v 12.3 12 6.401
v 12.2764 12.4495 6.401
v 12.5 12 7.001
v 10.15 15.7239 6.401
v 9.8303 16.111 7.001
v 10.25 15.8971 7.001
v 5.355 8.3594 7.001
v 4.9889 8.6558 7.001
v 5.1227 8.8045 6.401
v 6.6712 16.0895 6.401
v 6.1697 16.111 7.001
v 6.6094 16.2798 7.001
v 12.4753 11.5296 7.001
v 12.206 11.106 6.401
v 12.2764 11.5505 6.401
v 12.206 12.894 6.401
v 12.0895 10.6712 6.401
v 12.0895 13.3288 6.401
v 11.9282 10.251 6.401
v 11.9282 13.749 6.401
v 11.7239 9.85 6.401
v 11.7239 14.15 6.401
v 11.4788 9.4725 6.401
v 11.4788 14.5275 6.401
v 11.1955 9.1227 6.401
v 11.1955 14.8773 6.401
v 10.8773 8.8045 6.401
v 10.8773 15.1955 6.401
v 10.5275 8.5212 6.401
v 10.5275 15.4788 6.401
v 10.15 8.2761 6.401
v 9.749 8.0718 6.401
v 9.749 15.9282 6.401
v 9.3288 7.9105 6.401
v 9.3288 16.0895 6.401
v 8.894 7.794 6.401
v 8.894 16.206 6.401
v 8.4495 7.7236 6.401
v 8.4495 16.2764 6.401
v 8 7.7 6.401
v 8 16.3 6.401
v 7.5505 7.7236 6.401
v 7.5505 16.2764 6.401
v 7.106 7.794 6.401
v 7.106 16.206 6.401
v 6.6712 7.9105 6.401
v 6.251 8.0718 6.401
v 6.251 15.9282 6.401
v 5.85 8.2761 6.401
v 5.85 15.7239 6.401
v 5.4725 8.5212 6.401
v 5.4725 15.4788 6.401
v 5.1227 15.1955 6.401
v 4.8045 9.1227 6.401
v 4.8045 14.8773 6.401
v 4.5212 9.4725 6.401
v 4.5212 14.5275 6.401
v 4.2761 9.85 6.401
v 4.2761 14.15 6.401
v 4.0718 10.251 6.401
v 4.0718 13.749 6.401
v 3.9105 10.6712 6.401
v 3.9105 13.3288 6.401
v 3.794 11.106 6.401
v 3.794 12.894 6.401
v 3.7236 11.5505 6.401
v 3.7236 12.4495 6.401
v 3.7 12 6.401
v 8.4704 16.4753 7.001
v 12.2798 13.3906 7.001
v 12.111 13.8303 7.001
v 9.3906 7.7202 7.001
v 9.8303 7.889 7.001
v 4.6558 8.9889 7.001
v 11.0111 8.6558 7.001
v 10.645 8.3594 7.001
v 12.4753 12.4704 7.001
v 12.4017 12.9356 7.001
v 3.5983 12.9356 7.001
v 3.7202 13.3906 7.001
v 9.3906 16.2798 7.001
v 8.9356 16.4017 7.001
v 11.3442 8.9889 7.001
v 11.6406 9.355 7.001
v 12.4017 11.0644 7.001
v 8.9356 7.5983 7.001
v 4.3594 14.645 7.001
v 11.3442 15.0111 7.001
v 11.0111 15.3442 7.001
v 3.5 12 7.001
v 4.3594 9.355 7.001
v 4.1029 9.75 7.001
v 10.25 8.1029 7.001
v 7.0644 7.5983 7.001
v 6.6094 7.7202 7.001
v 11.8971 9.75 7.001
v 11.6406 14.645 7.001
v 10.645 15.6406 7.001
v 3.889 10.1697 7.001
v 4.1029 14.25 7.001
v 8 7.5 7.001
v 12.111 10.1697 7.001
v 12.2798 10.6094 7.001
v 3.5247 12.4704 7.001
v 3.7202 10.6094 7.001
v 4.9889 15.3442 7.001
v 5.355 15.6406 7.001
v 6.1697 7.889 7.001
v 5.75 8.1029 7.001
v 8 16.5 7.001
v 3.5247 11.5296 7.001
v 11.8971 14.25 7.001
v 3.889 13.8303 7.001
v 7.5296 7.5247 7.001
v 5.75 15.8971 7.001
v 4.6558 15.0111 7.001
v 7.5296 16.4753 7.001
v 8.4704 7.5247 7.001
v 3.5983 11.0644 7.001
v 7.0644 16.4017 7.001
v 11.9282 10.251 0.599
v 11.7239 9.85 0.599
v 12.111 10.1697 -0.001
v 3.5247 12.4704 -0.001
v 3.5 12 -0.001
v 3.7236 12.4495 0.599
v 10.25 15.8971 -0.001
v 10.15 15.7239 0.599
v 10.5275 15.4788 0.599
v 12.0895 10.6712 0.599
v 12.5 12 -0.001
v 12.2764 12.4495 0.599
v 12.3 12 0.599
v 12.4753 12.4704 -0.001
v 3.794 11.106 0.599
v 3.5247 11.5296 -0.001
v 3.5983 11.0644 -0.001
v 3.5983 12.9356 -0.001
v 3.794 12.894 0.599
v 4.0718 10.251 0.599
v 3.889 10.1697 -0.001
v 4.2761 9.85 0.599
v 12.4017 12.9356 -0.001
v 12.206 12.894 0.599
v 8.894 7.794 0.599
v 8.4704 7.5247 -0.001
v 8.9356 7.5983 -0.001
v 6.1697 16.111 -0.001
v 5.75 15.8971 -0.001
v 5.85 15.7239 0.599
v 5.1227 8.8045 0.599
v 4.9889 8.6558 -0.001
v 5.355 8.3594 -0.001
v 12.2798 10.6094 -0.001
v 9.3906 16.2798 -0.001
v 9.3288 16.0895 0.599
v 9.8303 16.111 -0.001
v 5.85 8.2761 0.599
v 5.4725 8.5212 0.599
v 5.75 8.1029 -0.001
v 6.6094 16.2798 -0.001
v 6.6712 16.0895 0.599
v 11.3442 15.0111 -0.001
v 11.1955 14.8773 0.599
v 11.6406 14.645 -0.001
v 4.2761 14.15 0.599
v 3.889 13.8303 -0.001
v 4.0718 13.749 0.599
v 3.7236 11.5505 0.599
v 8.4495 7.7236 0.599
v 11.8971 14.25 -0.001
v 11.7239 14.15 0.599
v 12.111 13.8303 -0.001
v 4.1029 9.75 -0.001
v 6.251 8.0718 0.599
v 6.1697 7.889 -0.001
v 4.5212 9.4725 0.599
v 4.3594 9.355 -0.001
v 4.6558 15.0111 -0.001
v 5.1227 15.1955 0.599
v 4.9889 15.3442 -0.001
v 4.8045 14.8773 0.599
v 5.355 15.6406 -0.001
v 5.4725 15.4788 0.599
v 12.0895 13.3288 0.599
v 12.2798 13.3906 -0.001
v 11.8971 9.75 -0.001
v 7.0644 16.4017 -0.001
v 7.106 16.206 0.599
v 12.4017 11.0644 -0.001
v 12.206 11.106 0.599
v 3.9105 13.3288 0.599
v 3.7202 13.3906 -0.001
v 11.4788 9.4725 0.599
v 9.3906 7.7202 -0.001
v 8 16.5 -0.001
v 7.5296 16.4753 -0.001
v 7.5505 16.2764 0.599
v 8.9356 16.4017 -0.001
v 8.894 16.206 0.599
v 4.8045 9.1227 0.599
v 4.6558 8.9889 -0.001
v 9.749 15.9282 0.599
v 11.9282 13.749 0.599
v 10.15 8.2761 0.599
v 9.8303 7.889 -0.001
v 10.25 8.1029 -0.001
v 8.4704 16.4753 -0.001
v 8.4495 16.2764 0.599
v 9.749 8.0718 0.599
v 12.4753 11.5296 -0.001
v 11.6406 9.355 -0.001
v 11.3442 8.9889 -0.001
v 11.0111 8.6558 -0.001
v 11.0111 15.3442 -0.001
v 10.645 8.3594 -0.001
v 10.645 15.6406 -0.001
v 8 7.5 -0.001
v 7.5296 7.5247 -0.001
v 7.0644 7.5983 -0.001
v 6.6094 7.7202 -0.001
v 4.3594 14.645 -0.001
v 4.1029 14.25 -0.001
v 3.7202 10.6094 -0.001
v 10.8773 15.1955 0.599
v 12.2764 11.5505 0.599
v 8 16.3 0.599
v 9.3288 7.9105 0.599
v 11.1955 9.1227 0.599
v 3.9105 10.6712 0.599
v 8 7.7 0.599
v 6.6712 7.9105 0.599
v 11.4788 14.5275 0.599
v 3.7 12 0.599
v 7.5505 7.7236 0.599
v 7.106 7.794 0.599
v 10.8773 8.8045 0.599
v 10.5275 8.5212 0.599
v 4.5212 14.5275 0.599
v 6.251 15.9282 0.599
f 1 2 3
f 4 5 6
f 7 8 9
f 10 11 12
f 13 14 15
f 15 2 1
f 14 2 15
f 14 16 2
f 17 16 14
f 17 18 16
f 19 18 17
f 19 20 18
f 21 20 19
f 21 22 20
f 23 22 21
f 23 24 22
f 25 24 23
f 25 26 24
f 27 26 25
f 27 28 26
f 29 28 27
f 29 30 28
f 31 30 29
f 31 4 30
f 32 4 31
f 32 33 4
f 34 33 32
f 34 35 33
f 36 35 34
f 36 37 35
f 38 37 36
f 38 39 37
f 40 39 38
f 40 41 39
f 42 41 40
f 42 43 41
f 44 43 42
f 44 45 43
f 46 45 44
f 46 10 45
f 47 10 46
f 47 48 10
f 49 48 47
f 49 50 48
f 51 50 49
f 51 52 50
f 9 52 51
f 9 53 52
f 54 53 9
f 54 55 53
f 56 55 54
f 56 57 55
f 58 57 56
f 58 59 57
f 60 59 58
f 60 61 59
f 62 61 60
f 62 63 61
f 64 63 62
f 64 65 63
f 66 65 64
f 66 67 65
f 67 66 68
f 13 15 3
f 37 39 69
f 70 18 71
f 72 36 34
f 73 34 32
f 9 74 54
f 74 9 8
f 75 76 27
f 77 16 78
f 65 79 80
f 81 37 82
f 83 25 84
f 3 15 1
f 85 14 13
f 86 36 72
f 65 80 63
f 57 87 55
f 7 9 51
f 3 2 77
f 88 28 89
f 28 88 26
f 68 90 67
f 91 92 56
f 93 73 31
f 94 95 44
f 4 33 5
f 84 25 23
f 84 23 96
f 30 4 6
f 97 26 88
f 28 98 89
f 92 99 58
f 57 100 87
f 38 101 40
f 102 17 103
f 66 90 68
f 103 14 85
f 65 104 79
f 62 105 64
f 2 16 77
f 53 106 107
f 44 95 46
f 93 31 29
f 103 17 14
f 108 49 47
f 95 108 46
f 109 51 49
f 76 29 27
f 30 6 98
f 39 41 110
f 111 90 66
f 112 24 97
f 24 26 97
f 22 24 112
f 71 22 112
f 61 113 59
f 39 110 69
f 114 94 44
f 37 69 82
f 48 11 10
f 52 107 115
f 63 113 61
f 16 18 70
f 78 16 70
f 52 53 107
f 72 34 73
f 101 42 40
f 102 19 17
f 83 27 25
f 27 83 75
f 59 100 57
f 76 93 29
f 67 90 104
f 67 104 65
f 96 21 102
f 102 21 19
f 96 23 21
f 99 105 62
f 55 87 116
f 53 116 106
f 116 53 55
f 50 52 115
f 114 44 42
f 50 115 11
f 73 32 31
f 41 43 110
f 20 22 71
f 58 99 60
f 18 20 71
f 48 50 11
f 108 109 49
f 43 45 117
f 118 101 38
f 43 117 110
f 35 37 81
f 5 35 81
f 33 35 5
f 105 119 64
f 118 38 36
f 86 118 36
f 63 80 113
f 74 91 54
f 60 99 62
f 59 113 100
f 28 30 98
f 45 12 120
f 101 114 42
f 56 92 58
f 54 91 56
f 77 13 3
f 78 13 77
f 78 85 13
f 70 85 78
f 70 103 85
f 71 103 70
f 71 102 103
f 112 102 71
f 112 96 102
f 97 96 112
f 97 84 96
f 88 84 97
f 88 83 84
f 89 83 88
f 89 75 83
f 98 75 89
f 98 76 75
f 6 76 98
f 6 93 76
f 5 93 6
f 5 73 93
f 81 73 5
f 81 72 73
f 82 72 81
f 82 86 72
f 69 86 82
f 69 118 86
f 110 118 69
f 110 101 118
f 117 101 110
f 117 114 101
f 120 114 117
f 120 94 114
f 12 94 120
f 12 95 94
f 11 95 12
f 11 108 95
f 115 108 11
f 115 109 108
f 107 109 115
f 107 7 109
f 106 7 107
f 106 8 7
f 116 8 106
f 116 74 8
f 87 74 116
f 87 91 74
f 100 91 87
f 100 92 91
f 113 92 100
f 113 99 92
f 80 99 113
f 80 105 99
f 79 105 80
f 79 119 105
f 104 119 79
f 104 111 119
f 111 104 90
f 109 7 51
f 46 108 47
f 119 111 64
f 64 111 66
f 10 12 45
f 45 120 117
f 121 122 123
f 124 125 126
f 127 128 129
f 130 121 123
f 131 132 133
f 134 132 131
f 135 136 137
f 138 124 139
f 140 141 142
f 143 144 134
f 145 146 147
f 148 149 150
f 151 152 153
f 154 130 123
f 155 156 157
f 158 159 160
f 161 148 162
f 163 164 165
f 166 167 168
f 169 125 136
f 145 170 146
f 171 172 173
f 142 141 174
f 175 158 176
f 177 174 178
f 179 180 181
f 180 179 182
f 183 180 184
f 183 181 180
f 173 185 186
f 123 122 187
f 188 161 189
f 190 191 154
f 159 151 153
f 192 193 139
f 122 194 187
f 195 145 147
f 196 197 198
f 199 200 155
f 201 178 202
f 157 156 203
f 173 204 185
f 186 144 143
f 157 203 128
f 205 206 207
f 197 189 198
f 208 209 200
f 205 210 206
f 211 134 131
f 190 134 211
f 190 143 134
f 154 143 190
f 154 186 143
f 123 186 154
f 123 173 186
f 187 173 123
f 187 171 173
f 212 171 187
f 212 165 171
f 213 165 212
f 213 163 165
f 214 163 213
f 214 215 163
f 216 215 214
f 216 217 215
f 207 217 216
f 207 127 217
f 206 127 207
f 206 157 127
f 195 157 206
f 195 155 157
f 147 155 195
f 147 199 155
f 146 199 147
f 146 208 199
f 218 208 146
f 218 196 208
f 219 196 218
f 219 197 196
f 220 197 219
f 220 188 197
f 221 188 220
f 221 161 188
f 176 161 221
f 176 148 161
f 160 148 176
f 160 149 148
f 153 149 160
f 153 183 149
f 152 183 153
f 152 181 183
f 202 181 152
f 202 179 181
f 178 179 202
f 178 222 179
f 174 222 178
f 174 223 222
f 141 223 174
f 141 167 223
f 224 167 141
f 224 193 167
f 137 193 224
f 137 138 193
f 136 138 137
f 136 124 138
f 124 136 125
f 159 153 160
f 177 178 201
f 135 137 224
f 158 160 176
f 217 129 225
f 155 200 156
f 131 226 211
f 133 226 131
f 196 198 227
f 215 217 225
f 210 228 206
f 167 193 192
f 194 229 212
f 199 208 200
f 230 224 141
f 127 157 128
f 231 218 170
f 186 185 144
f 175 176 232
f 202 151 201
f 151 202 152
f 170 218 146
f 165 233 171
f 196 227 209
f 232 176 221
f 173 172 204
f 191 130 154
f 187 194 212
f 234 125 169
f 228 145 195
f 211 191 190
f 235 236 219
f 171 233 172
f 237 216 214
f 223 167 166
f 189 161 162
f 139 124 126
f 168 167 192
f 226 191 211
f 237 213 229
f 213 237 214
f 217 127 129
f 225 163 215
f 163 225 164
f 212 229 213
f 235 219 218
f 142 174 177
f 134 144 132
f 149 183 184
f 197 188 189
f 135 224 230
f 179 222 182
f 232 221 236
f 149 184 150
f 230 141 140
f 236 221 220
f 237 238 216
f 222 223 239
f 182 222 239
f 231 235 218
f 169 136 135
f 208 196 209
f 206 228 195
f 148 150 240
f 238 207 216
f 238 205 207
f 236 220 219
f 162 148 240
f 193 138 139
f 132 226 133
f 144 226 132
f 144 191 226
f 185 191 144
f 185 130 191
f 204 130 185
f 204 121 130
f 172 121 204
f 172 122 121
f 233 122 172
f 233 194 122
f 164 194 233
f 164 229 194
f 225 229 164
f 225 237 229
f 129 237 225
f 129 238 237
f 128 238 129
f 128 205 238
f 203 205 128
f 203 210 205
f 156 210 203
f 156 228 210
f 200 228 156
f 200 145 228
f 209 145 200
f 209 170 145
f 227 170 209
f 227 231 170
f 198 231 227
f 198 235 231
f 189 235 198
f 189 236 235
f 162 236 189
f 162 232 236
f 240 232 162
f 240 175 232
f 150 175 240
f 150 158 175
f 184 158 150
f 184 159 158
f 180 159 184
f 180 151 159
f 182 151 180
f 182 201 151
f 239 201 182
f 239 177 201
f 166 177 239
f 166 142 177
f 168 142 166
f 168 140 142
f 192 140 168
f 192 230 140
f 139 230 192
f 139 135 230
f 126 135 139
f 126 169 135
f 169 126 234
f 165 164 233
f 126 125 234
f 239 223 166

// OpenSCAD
/*
"OpenScad library. Threads for screws and nuts V1" 
by ANDRES ROMAN (AKA Cuiso) September 2018

* Copyright 2018 ANDRES ROMAN (AKA Cuiso)
* Licensed under the Creative Commons - Attribution license.
* This software is free software, you can Share and Adapt under the terms of Attribution
(give appropriate credit).
*   
* you can visit https://creativecommons.org/licenses/by/3.0/ for more details

* This software is distributed WITHOUT ANY WARRANTY.

*/

//For use this library you can put the file threads-library-by-cuiso-v1.scad in the same directory of your proyect and put the line use <threads-library-by-cuiso-v1.scad> in your own .scad file
//You can see examples of use in file examples.scad

/*
This is a library to include threads for screws and nuts in your own designs.

This library is focused to provide simple functions with preset parameters by default,
and not to be too demanding in CPU consumption neither in previsualizacion nor in rendering

This library has been tested printing on PLA with 0.1 layer. Except for smaller diameter
threads layers greater than 0.1 should work well.
Diamaters tested between 3mm and 10mm, but you can use any diameter of your choice. 

Shape of the threads are similar (but not equal) to ISO METRIC threads.
Some tests have been done using screws and nuts printed with this library in
combination with screws and nuts of metal with acceptable results. However, they have
not been exhaustive tests.
*/

/*
>>>>>>>>>>>>>>>>>>>>>>>>>>>>>>>>>>>>>>>>>>>>>>>>>>>>>>
AVAILABLE FUNCTIONS:

BASIC FUNCTIONS (USING PREDEFINED PARAMETERS):

thread_for_screw(diameter, length);
    Generates a screw thread of the diameter indicated by the "diameter" parameter and of the length indicated by "length". This function uses standard pitch values depending on the diameter specified.
    diameter: Free value, in milimeters.
    length: Free value, in milimeters.
    
    Example:
    thread_for_screw(diameter=10, length=30);

module thread_for_nut(diameter, length, usrclearance=0);
    Generates a nut thread of the diameter indicated by the "diameter" parameter and of the length indicated by "length". This function uses standard pitch values depending on the diameter specified.
    The generated thread can be subtracted from any element of your design using the operator "difference()", thus obtaining a thread where a screw will fit.
    This function uses standard clearance for adjustment between screw and nut depending on the diameter specified.
    diameter: Free value, in milimeters.
    length: Free value, in milimeters.
    usrclearance: (optional) If the screw fits too tight on the nut you can specify a positive correction value (try 0.1 for example).
    If the screw fits too loose in the nut you can specify a negative correction value (try -0.1 for example).
    
    Example:
    thread_for_nut(diameter=10, length=20);
    

MORE AVAILABLE FUNCTIONS (WITH ADDITIONAL PARAMETERS):

thread_for_screw_fullparm(diameter, length, pitch, divs=50);
    Generates a screw thread of the diameter indicated by the "diameter" parameter and of the length indicated by "length", with pitch indicated by "pitch", and a resolution indicated by "divs". 
    This function allows you to specify a non-standard "pitch" value.
    diameter: Free value, in milimeters.
    length: Free value, in milimeters.
    pitch: Pitch value.
    divs: (optional) you can obtain more or less resolution with parm. Higher values for more resolution (and more rendering time). Default value is 50.
        
    Example:
    thread_for_screw_fullparm(diameter=10, length=30, pitch=2, divs=60);

thread_for_nut_fullparm(diameter, length, usrclearance=0, pitch, divs=50, entry=1);
    Generates a nut thread with additional parameters:
    diameter: Free value, in milimeters.
    length: Free value, in milimeters.
    usrclearance: (optional) If the screw fits too tight on the nut you can specify a positive correction value (try 0.1 for example).
    If the screw fits too loose in the nut you can specify a negative correction value (try -0.1 for example).
    pitch: Pitch value.
    divs: (optional) you can obtain more or less resolution with parm. Higher values for more resolution (and more rendering time). Default value is 50.
    entry: By default, the nut threads include a wider entrance area at the beginning and end to facilitate the introduction of the screw and minimize "elephant foot" problems.
    Specify 1 in entry to use these zones and 0 to not use them.
    
    Example:
    thread_for_nut_fullparm(diameter=10,length=20,usrclearance=0.1,pitch=1.5,divs=60, entry=1);
>>>>>>>>>>>>>>>>>>>>>>>>>>>>>>>>>>>>>>>>>>>>>>>>>>>>>>
*/   

/*
>>>>>>>>>>>>>>>>>>>>>>>>>>>>>>>>>>>>>>>>>>>>>>>>>>>>>>
SOME NOTES:
- At first preview(F5) of the design may appear in console a lot of messages:
"PolySet has nonplanar faces. Attempting alternate construction"
simply ignore those messages, they are not a problem.

- I have no lag problems in preview(F5) mode during the test of this library. If you are suffering lag problems in preview you can try to un-comment the "render()" al lines 250 and 255.  

- This library uses by default PITCH values: 
  DIAMETER    PITCH_VALUE
  3mm        0.5mm
  4mm        0.7mm
  5mm        0.8mm
  6mm        1.0mm
  8mm        1.25mm
 10mm        1.5mm
 ...
 24mm        3.0mm
 (complete list defined at get_std_pitch(diam))
>>>>>>>>>>>>>>>>>>>>>>>>>>>>>>>>>>>>>>>>>>>>>>>>>>>>>>
*/


//EXAMPLE FOR CUSTOMIZER:
//1 to draw rod, 0 to not draw rod
drawrod=1; 
//1 to draw nut, 0 to not draw nut
drawnut=1;
diameter=8; 
lengthrod=15; 
lengthnut=7; 
//Example of USE, a rod SCREW:
if(drawrod==1)thread_for_screw(diameter=diameter, length=lengthrod);
//Example of USE, a FEMALE THREAD to be removed (with difference ()) from another figure:
if(drawnut==1)
translate([diameter,1.5*diameter,0]){
thread_for_nut(diameter=diameter, length=lengthnut);
}




//>>>>>>>>>>>>>>>>>>>>>>>>>>>>>>>>>>>>>>>>>>>>>>>>>>>>>>>>>>>>>>>>>>>>>>>>>>>>>>>>>>>
module thread_for_screw(diameter, length)
{
stdpitch=get_std_pitch(diameter);
thread_for_screw_cuiso_tec(diameter,length,stdpitch,50);
echo(diameter);echo(stdpitch);
}

module thread_for_nut(diameter, length, usrclearance=0)
{
stdpitch=get_std_pitch(diameter);
stdclearance=get_std_clearance(diameter);

thread_for_nut_cuiso_tec
(diameter+stdclearance+usrclearance,length,stdpitch,50,entry=1);
    
echo(diameter);echo(stdpitch);echo(stdclearance+usrclearance);
}

//>>>>>>>>>>>>>>>>>>>>>>>>>>>>>>>>>>>>>>>>>>>>>>>>>>>>>>>>>>>>>>>>>>>>>>>>>>>>>>>>>>>
module thread_for_screw_fullparm(diameter, length, pitch, divs=50)
{
if(divs<20) thread_for_screw_cuiso_tec(diameter,length,pitch,20);
    else if(divs>360) thread_for_screw_cuiso_tec(diameter,length,pitch,360);
        else thread_for_screw_cuiso_tec(diameter,length,pitch,divs);
}

module thread_for_nut_fullparm(diameter, length, usrclearance=0, pitch, divs=50, entry=1)
{
stdclearance=get_std_clearance(diameter);

if(divs<20)thread_for_nut_cuiso_tec
(diameter+stdclearance+usrclearance,length,pitch,20,entry=entry);
else
if(divs>360)thread_for_nut_cuiso_tec
(diameter+stdclearance+usrclearance,length,pitch,360,entry=entry);
else
thread_for_nut_cuiso_tec
(diameter+stdclearance+usrclearance,length,pitch,divs,entry=entry);
}

//>>>>>>>>>>>>>>>>>>>>>>>>>>>>>>>>>>>>>>>>>>>>>>>>>>>>>>>>>>>>>>>>>>>>>>>>>>>>>>>>>>>
function get_std_pitch(diam) = 
lookup(diam,[[3,0.5],[4,0.7],[5,0.8],[6,1.0],[8,1.25],[10,1.5],
[12,1.75],[14,2.0],[16,2.0],[18,2.5],[20,2.5],[22,2.5],[24,3.0]
]);

function get_std_clearance(diam) = 
lookup(diam,[[3,0.4],[4,0.4],[5,0.5],[6,0.6],[8,0.6],[10,0.6],
[12,0.7],[14,0.7],[16,0.7],[18,0.7],[20,0.8],[22,0.8],[24,0.8]
]);
//>>>>>>>>>>>>>>>>>>>>>>>>>>>>>>>>>>>>>>>>>>>>>>>>>>>>>>>>>>>>>>>>>>>>>>>>>>>>>>>>>>>
module thread_for_screw_cuiso_tec(diameter,lenght,pitch,divdelta){
delta=360/divdelta;
intersection(){
cubointter(long=lenght,pitch=pitch,diameter=diameter);
rosca(long=lenght,p=pitch,delta=delta,diameter=diameter);
}
//#cylinder(d=diameter,h=lenght,$fn=100);
}

module thread_for_nut_cuiso_tec(diameter,lenght,pitch,divdelta,entry){
delta=360/divdelta;
translate([0,0,-0.001])
intersection(){
rosca(long=lenght+0.002,p=pitch,delta=delta,diameter=diameter,nut=1);
cubointter_nut(lenght+0.002,pitch,diameter);
}
if(entry==1){translate([0,0,-0.001])cubointter_nut_entry(lenght+0.002,pitch,diameter);}
//#cylinder(d=diameter,h=lenght,$fn=100);
}

module cubointter(long,pitch,diameter)
{
longcube=long-pitch;
translate([0,0,longcube/2+pitch/2])cube([diameter,diameter,longcube],center=true);
translate([0,0,longcube+pitch/2])
cylinder(d1=diameter,d2=diameter-2*pitch*0.866,h=pitch/2, $fn=60);
cylinder(d2=diameter,d1=diameter-2*pitch*0.866,h=pitch/2, $fn=60);
}

module cubointter_nut(long,pitch,diameter)
{
longcube=long;
translate([0,0,longcube/2])cube([diameter,diameter,longcube],center=true);
}

module cubointter_nut_entry(long,pitch,diameter)
{
longcube=long-0.6;
translate([0,0,longcube])
cylinder(d2=diameter+0.4,d1=diameter,h=0.6, $fn=60);
cylinder(d1=diameter+0.4,d2=diameter,h=0.6, $fn=60);
}

module rosca(long,p,delta,diameter,nut=0)
{
vueltas=round(long/p+0.5)+1;
translate([0,0,-p/4])
for(v = [0 : 1 : vueltas-1])
translate([0,0,v*p])
vuelta(p=p,delta=delta,diameter=diameter,nut=nut);
}

module vuelta(p,delta,diameter,nut)
{
medio(p=p,delta=delta,diameter=diameter,nut=nut);

translate([0,0.001,0])
rotate([0,180,180])
medio(p=p,delta=delta,diameter=diameter,nut=nut);
}

module medio(p,delta,diameter,nut)
{
if(nut==1)
//render()
hull()
for(k = [0 : delta : 180])
translate([0,0,k*p/360])rotate([0,0,k])pieza_nut(diameter=diameter, p=p);
else
//render()
hull()
for(k = [0 : delta : 180])
translate([0,0,k*p/360])rotate([0,0,k])pieza(diameter=diameter, p=p);
}

module pieza(diameter, p)
{
r=diameter/2;
h=p*0.866;
pp=p/2;
pm=-p/2;
hh=r-h;

polyhedron([
    [0,0,pp],[hh,0,pp],[r-h/8,0,p/16],[r-h/8,0,-p/16],[hh,0,pm],[0,0,pm]
    ], 
    [[0,1,2,3,4,5]]);
}

module pieza_nut(diameter, p)
{
r=diameter/2;
h=p*0.866;
pp=p/2;
pm=-p/2;
hh=r-h;
polyhedron([[0,0,pp],[hh,0,pp],[r,0,0],[hh,0,pm],[0,0,pm]], [[0,1,2,3,4]]);
}
